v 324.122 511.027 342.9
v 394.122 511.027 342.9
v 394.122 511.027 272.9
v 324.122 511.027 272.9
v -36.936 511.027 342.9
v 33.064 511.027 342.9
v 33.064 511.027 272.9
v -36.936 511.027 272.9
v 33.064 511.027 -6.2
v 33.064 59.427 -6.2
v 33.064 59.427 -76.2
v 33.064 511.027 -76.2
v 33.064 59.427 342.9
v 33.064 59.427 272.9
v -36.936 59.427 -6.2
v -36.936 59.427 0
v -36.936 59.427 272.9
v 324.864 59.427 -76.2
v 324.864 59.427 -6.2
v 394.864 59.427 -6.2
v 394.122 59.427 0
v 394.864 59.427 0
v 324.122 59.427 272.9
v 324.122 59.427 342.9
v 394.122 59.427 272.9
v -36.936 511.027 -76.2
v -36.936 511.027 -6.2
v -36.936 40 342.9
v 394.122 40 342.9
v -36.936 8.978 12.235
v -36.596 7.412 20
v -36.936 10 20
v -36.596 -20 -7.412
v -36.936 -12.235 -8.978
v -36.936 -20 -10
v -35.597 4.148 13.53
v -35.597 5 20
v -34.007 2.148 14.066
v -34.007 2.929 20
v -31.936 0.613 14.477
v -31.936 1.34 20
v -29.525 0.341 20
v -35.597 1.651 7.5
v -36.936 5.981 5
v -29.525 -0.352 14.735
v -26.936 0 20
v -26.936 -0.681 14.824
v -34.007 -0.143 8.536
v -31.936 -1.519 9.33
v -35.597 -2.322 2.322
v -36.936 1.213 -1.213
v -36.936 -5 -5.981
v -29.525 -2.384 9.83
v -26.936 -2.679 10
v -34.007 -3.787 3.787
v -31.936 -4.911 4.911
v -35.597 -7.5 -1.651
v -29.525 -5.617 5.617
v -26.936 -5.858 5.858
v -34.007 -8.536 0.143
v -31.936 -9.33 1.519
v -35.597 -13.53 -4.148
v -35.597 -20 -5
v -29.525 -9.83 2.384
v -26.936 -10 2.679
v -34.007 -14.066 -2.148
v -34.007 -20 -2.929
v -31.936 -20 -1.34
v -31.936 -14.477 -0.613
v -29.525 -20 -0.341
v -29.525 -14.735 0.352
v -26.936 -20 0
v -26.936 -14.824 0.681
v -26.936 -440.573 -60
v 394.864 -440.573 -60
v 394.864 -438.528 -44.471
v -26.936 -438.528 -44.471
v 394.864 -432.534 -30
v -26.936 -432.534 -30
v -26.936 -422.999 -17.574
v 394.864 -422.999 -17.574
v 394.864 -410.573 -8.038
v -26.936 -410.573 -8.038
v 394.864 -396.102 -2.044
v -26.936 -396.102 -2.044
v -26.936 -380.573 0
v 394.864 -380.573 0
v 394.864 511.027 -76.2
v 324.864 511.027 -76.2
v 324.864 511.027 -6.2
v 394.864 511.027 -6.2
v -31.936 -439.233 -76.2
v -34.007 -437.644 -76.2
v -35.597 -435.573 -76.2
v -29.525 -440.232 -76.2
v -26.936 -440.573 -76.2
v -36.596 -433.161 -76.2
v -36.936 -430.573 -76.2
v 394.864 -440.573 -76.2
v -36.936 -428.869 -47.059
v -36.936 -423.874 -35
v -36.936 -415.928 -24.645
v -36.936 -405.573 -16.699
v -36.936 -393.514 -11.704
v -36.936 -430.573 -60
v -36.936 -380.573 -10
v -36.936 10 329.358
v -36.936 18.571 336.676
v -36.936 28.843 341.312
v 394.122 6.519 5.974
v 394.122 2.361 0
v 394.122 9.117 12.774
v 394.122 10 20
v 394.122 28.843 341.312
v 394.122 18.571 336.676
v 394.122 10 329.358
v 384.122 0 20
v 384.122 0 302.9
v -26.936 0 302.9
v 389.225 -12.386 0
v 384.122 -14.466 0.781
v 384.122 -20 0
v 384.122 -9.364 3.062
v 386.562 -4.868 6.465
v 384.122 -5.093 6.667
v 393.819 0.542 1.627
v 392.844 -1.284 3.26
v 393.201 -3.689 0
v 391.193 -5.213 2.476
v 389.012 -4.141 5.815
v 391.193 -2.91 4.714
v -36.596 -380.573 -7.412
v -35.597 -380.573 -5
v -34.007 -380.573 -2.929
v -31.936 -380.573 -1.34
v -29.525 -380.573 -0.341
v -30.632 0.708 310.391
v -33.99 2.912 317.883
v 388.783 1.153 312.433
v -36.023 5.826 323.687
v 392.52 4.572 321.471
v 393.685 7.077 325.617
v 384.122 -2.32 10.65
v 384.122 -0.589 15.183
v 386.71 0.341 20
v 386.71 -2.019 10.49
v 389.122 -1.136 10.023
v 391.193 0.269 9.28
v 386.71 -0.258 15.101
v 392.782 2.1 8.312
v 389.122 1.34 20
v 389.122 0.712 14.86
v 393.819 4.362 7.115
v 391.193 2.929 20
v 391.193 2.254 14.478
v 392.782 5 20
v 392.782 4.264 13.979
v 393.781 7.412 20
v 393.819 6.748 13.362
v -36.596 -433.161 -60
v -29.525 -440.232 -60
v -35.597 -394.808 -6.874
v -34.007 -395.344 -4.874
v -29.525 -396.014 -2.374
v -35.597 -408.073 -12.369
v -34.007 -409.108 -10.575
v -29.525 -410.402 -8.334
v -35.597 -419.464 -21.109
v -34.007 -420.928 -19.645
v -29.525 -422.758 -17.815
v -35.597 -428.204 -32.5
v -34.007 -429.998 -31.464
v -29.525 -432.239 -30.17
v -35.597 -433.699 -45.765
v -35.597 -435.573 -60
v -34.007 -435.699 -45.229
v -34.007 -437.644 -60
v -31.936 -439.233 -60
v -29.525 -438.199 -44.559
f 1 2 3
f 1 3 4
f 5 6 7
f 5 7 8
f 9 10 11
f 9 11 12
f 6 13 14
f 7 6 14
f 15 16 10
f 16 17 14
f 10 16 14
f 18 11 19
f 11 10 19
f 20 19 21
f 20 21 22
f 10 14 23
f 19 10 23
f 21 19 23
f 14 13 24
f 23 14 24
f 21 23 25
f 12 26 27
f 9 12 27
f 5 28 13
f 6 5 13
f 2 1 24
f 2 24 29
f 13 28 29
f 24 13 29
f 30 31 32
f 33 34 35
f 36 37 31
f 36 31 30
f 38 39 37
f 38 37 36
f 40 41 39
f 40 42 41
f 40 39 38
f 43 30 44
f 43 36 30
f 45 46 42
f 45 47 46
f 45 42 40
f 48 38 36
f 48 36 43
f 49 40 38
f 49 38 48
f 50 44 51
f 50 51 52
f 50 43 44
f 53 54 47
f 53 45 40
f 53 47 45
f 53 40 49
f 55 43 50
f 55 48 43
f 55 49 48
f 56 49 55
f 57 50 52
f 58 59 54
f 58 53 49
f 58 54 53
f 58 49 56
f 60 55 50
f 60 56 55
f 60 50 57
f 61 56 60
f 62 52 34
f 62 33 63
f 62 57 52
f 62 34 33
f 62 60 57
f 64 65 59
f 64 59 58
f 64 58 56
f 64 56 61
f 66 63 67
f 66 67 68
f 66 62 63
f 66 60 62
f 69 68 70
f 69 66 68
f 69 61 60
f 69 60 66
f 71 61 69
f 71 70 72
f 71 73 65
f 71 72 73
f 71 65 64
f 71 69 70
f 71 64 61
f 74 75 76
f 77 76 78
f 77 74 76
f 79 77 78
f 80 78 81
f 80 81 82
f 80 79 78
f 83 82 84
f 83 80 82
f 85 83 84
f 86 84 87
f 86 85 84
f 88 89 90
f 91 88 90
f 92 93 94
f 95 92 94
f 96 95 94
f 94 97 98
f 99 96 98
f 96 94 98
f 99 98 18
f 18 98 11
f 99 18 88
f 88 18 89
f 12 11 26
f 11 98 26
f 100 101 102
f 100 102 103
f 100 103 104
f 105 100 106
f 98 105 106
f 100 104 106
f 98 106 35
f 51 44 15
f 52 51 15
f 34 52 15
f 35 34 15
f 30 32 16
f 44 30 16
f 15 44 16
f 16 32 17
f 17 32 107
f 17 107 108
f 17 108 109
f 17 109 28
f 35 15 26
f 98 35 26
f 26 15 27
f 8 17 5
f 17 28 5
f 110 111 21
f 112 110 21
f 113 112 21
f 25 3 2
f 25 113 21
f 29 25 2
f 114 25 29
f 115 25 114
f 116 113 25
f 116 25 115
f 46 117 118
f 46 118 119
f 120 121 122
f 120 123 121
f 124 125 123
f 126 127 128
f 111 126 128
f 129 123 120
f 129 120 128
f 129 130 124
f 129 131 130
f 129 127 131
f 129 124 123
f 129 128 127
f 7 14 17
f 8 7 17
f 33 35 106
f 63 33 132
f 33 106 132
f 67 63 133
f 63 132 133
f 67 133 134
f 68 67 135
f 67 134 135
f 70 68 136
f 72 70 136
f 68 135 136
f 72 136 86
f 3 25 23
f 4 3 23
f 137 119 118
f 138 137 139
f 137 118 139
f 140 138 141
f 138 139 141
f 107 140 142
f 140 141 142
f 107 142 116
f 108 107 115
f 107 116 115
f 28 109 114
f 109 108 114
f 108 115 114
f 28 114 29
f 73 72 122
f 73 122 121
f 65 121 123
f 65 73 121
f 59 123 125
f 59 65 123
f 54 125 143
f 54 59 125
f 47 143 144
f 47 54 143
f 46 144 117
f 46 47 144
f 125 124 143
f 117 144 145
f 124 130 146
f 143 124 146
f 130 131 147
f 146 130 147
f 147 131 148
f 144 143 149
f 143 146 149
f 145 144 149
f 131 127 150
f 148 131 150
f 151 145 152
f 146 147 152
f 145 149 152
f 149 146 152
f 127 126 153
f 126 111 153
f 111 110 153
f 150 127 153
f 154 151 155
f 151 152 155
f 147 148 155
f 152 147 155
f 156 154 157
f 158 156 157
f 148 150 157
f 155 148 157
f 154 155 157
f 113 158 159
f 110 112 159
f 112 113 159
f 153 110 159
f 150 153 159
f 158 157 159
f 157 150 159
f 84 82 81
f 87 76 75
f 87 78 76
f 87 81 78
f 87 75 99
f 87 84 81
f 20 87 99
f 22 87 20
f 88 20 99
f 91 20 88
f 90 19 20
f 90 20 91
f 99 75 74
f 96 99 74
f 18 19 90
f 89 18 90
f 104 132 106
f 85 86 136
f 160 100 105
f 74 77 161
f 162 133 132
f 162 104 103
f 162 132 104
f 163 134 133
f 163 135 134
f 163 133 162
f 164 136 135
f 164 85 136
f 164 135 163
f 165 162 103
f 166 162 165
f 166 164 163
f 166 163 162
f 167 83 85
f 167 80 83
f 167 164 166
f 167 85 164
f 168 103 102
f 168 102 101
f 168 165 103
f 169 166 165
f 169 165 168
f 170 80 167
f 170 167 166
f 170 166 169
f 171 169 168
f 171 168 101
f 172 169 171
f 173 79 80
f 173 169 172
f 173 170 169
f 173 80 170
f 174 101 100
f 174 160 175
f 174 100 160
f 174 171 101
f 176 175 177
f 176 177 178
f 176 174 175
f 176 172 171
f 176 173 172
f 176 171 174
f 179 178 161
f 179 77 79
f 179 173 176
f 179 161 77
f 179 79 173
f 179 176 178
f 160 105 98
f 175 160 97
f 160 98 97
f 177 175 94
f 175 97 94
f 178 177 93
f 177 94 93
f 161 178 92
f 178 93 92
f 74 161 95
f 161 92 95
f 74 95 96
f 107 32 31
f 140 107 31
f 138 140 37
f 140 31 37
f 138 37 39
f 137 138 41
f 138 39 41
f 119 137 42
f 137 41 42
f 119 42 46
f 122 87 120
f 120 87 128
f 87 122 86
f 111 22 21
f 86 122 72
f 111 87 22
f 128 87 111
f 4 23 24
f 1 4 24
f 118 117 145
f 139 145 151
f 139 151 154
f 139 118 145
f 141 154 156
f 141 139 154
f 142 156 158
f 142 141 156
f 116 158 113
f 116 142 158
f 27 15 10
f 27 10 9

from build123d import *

# Parameters (mm, degrees)
BASE_EXTRUDE_DEPTH  = 76.2
BOSS_EXTRUDE2_DEPTH = 59.427356
SKETCH4_W           = 70
SKETCH4_H           = 70
BOSS_EXTRUDE3_DEPTH = 451.60000000000053
FILLET1_START       = -36.936387435
FILLET1_DEPTH       = 431.8
FILLET1_2_OUTLINE_W = 451.6
FILLET1_2_OUTLINE_H = 70
FILLET1_2_DEPTH     = 70
FILLET1_START_2     = 324.863612565
FILLET1_3_OUTLINE_W = 451.6
FILLET1_3_OUTLINE_H = 70
FILLET1_3_DEPTH     = 70
FILLET2_R           = 19.999999999999996
FILLET4_R           = 9.999999999999996
FILLET7_R           = 9.999999999999996
FILLET11_R          = 40


with BuildPart() as part:
    # Sketch1 → Base-Extrude (new body)
    with BuildSketch(Plane.XY):
        Polygon((-36.93638743455497, 59.4273560209424), (394.863612565445, 59.4273560209424), (394.86361256544507, -440.5726439790576), (-36.93638743455492, -440.5726439790576), align=None)
    extrude(amount=-BASE_EXTRUDE_DEPTH)

    # Sketch3 → Boss-Extrude2 (add)
    with BuildSketch(Plane(origin=(0, 0, 0), x_dir=(1, 0, 0), z_dir=(0, 1, 0))):
        Polygon((-36.93638743455497, 76.2), (394.1216881668196, 76.2), (394.12168816681964, -342.9), (-36.93638743455493, -342.9), align=None)
    extrude(amount=BOSS_EXTRUDE2_DEPTH)

    # Sketch4 → Boss-Extrude3 (add)
    with BuildSketch(Plane(origin=(0, 59.4273560209424, 0), x_dir=(-1, 0, 0), z_dir=(0, 1, 0))):
        Polygon((36.93638743455493, 342.9), (-33.06361256544507, 342.9), (-33.06361256544506, 272.9), (36.93638743455494, 272.9), align=None)
        with Locations((-359.12168816681964, 307.9)):
            Rectangle(SKETCH4_W, SKETCH4_H)
    extrude(amount=BOSS_EXTRUDE3_DEPTH)

    # Fillet1: read off the stored shape, not the designer's step
    # Fillet1 outline → Fillet1 (cut)
    with BuildSketch(Plane.YZ.offset(FILLET1_START)):
        with BuildLine():
            Line((-440.572643979, 0), (-440.572643979, -60))
            ThreePointArc((-440.572643979, -60), (-422.99905085, -17.573593129), (-380.572643979, 0))
            Line((-380.572643979, 0), (-440.572643979, 0))
        make_face()
    extrude(amount=FILLET1_DEPTH, mode=Mode.SUBTRACT)

    # Fillet1 2 outline → Fillet1 2 (add)
    with BuildSketch(Plane.YZ.offset(FILLET1_START)):
        with Locations((285.227356021, -41.2)):
            Rectangle(FILLET1_2_OUTLINE_W, FILLET1_2_OUTLINE_H)
    extrude(amount=FILLET1_2_DEPTH)

    # Fillet1 3 outline → Fillet1 3 (add)
    with BuildSketch(Plane.YZ.offset(FILLET1_START_2)):
        with Locations((285.227356021, -41.2)):
            Rectangle(FILLET1_3_OUTLINE_W, FILLET1_3_OUTLINE_H)
    extrude(amount=FILLET1_3_DEPTH)

    # Fillet2
    fillet2_edges = [part.edges().sort_by_distance(p)[0] for p in [
        (178.59265036613232, 0, 0),
    ]]
    fillet(fillet2_edges, radius=FILLET2_R)

    # Fillet4
    fillet4_edges = [part.edges().sort_by_distance(p)[0] for p in [
        (394.12168816681964, 0, 181.45),
        (394.1216881668196, -5.857864376269045, 5.857864376269044),
    ]]
    fillet(fillet4_edges, radius=FILLET4_R)

    # Fillet7
    fillet7_edges = [part.edges().sort_by_distance(p)[0] for p in [
        (-36.93638743455492, -440.5726439790576, -68.1),
        (-36.936387435, -422.99905085, -17.573593129000002),
        (-36.936387434554945, -200.2863219895, 0),
        (-36.936387434554945, 0, 181.45),
        (-36.936387434554945, -5.857864376269045, 5.857864376269044),
    ]]
    fillet(fillet7_edges, radius=FILLET7_R)

    # Fillet11
    # the kernel refuses this fillet: 40 mm, written as the material it takes off along each edge
    with BuildSketch(Plane(origin=(484.12168816681964, 0, 342.9), x_dir=(0, 0, -1), z_dir=(-1, 0, 0))) as fillet11_piece_1:
        with BuildLine():
            CenterArc((FILLET11_R, -FILLET11_R), FILLET11_R, 90, 90)
            Line((0, -FILLET11_R), (0, 0))
            Line((0, 0), (FILLET11_R, 0))
        make_face()
    extrude(amount=611.0580756013748, mode=Mode.SUBTRACT)


solid = part.part
